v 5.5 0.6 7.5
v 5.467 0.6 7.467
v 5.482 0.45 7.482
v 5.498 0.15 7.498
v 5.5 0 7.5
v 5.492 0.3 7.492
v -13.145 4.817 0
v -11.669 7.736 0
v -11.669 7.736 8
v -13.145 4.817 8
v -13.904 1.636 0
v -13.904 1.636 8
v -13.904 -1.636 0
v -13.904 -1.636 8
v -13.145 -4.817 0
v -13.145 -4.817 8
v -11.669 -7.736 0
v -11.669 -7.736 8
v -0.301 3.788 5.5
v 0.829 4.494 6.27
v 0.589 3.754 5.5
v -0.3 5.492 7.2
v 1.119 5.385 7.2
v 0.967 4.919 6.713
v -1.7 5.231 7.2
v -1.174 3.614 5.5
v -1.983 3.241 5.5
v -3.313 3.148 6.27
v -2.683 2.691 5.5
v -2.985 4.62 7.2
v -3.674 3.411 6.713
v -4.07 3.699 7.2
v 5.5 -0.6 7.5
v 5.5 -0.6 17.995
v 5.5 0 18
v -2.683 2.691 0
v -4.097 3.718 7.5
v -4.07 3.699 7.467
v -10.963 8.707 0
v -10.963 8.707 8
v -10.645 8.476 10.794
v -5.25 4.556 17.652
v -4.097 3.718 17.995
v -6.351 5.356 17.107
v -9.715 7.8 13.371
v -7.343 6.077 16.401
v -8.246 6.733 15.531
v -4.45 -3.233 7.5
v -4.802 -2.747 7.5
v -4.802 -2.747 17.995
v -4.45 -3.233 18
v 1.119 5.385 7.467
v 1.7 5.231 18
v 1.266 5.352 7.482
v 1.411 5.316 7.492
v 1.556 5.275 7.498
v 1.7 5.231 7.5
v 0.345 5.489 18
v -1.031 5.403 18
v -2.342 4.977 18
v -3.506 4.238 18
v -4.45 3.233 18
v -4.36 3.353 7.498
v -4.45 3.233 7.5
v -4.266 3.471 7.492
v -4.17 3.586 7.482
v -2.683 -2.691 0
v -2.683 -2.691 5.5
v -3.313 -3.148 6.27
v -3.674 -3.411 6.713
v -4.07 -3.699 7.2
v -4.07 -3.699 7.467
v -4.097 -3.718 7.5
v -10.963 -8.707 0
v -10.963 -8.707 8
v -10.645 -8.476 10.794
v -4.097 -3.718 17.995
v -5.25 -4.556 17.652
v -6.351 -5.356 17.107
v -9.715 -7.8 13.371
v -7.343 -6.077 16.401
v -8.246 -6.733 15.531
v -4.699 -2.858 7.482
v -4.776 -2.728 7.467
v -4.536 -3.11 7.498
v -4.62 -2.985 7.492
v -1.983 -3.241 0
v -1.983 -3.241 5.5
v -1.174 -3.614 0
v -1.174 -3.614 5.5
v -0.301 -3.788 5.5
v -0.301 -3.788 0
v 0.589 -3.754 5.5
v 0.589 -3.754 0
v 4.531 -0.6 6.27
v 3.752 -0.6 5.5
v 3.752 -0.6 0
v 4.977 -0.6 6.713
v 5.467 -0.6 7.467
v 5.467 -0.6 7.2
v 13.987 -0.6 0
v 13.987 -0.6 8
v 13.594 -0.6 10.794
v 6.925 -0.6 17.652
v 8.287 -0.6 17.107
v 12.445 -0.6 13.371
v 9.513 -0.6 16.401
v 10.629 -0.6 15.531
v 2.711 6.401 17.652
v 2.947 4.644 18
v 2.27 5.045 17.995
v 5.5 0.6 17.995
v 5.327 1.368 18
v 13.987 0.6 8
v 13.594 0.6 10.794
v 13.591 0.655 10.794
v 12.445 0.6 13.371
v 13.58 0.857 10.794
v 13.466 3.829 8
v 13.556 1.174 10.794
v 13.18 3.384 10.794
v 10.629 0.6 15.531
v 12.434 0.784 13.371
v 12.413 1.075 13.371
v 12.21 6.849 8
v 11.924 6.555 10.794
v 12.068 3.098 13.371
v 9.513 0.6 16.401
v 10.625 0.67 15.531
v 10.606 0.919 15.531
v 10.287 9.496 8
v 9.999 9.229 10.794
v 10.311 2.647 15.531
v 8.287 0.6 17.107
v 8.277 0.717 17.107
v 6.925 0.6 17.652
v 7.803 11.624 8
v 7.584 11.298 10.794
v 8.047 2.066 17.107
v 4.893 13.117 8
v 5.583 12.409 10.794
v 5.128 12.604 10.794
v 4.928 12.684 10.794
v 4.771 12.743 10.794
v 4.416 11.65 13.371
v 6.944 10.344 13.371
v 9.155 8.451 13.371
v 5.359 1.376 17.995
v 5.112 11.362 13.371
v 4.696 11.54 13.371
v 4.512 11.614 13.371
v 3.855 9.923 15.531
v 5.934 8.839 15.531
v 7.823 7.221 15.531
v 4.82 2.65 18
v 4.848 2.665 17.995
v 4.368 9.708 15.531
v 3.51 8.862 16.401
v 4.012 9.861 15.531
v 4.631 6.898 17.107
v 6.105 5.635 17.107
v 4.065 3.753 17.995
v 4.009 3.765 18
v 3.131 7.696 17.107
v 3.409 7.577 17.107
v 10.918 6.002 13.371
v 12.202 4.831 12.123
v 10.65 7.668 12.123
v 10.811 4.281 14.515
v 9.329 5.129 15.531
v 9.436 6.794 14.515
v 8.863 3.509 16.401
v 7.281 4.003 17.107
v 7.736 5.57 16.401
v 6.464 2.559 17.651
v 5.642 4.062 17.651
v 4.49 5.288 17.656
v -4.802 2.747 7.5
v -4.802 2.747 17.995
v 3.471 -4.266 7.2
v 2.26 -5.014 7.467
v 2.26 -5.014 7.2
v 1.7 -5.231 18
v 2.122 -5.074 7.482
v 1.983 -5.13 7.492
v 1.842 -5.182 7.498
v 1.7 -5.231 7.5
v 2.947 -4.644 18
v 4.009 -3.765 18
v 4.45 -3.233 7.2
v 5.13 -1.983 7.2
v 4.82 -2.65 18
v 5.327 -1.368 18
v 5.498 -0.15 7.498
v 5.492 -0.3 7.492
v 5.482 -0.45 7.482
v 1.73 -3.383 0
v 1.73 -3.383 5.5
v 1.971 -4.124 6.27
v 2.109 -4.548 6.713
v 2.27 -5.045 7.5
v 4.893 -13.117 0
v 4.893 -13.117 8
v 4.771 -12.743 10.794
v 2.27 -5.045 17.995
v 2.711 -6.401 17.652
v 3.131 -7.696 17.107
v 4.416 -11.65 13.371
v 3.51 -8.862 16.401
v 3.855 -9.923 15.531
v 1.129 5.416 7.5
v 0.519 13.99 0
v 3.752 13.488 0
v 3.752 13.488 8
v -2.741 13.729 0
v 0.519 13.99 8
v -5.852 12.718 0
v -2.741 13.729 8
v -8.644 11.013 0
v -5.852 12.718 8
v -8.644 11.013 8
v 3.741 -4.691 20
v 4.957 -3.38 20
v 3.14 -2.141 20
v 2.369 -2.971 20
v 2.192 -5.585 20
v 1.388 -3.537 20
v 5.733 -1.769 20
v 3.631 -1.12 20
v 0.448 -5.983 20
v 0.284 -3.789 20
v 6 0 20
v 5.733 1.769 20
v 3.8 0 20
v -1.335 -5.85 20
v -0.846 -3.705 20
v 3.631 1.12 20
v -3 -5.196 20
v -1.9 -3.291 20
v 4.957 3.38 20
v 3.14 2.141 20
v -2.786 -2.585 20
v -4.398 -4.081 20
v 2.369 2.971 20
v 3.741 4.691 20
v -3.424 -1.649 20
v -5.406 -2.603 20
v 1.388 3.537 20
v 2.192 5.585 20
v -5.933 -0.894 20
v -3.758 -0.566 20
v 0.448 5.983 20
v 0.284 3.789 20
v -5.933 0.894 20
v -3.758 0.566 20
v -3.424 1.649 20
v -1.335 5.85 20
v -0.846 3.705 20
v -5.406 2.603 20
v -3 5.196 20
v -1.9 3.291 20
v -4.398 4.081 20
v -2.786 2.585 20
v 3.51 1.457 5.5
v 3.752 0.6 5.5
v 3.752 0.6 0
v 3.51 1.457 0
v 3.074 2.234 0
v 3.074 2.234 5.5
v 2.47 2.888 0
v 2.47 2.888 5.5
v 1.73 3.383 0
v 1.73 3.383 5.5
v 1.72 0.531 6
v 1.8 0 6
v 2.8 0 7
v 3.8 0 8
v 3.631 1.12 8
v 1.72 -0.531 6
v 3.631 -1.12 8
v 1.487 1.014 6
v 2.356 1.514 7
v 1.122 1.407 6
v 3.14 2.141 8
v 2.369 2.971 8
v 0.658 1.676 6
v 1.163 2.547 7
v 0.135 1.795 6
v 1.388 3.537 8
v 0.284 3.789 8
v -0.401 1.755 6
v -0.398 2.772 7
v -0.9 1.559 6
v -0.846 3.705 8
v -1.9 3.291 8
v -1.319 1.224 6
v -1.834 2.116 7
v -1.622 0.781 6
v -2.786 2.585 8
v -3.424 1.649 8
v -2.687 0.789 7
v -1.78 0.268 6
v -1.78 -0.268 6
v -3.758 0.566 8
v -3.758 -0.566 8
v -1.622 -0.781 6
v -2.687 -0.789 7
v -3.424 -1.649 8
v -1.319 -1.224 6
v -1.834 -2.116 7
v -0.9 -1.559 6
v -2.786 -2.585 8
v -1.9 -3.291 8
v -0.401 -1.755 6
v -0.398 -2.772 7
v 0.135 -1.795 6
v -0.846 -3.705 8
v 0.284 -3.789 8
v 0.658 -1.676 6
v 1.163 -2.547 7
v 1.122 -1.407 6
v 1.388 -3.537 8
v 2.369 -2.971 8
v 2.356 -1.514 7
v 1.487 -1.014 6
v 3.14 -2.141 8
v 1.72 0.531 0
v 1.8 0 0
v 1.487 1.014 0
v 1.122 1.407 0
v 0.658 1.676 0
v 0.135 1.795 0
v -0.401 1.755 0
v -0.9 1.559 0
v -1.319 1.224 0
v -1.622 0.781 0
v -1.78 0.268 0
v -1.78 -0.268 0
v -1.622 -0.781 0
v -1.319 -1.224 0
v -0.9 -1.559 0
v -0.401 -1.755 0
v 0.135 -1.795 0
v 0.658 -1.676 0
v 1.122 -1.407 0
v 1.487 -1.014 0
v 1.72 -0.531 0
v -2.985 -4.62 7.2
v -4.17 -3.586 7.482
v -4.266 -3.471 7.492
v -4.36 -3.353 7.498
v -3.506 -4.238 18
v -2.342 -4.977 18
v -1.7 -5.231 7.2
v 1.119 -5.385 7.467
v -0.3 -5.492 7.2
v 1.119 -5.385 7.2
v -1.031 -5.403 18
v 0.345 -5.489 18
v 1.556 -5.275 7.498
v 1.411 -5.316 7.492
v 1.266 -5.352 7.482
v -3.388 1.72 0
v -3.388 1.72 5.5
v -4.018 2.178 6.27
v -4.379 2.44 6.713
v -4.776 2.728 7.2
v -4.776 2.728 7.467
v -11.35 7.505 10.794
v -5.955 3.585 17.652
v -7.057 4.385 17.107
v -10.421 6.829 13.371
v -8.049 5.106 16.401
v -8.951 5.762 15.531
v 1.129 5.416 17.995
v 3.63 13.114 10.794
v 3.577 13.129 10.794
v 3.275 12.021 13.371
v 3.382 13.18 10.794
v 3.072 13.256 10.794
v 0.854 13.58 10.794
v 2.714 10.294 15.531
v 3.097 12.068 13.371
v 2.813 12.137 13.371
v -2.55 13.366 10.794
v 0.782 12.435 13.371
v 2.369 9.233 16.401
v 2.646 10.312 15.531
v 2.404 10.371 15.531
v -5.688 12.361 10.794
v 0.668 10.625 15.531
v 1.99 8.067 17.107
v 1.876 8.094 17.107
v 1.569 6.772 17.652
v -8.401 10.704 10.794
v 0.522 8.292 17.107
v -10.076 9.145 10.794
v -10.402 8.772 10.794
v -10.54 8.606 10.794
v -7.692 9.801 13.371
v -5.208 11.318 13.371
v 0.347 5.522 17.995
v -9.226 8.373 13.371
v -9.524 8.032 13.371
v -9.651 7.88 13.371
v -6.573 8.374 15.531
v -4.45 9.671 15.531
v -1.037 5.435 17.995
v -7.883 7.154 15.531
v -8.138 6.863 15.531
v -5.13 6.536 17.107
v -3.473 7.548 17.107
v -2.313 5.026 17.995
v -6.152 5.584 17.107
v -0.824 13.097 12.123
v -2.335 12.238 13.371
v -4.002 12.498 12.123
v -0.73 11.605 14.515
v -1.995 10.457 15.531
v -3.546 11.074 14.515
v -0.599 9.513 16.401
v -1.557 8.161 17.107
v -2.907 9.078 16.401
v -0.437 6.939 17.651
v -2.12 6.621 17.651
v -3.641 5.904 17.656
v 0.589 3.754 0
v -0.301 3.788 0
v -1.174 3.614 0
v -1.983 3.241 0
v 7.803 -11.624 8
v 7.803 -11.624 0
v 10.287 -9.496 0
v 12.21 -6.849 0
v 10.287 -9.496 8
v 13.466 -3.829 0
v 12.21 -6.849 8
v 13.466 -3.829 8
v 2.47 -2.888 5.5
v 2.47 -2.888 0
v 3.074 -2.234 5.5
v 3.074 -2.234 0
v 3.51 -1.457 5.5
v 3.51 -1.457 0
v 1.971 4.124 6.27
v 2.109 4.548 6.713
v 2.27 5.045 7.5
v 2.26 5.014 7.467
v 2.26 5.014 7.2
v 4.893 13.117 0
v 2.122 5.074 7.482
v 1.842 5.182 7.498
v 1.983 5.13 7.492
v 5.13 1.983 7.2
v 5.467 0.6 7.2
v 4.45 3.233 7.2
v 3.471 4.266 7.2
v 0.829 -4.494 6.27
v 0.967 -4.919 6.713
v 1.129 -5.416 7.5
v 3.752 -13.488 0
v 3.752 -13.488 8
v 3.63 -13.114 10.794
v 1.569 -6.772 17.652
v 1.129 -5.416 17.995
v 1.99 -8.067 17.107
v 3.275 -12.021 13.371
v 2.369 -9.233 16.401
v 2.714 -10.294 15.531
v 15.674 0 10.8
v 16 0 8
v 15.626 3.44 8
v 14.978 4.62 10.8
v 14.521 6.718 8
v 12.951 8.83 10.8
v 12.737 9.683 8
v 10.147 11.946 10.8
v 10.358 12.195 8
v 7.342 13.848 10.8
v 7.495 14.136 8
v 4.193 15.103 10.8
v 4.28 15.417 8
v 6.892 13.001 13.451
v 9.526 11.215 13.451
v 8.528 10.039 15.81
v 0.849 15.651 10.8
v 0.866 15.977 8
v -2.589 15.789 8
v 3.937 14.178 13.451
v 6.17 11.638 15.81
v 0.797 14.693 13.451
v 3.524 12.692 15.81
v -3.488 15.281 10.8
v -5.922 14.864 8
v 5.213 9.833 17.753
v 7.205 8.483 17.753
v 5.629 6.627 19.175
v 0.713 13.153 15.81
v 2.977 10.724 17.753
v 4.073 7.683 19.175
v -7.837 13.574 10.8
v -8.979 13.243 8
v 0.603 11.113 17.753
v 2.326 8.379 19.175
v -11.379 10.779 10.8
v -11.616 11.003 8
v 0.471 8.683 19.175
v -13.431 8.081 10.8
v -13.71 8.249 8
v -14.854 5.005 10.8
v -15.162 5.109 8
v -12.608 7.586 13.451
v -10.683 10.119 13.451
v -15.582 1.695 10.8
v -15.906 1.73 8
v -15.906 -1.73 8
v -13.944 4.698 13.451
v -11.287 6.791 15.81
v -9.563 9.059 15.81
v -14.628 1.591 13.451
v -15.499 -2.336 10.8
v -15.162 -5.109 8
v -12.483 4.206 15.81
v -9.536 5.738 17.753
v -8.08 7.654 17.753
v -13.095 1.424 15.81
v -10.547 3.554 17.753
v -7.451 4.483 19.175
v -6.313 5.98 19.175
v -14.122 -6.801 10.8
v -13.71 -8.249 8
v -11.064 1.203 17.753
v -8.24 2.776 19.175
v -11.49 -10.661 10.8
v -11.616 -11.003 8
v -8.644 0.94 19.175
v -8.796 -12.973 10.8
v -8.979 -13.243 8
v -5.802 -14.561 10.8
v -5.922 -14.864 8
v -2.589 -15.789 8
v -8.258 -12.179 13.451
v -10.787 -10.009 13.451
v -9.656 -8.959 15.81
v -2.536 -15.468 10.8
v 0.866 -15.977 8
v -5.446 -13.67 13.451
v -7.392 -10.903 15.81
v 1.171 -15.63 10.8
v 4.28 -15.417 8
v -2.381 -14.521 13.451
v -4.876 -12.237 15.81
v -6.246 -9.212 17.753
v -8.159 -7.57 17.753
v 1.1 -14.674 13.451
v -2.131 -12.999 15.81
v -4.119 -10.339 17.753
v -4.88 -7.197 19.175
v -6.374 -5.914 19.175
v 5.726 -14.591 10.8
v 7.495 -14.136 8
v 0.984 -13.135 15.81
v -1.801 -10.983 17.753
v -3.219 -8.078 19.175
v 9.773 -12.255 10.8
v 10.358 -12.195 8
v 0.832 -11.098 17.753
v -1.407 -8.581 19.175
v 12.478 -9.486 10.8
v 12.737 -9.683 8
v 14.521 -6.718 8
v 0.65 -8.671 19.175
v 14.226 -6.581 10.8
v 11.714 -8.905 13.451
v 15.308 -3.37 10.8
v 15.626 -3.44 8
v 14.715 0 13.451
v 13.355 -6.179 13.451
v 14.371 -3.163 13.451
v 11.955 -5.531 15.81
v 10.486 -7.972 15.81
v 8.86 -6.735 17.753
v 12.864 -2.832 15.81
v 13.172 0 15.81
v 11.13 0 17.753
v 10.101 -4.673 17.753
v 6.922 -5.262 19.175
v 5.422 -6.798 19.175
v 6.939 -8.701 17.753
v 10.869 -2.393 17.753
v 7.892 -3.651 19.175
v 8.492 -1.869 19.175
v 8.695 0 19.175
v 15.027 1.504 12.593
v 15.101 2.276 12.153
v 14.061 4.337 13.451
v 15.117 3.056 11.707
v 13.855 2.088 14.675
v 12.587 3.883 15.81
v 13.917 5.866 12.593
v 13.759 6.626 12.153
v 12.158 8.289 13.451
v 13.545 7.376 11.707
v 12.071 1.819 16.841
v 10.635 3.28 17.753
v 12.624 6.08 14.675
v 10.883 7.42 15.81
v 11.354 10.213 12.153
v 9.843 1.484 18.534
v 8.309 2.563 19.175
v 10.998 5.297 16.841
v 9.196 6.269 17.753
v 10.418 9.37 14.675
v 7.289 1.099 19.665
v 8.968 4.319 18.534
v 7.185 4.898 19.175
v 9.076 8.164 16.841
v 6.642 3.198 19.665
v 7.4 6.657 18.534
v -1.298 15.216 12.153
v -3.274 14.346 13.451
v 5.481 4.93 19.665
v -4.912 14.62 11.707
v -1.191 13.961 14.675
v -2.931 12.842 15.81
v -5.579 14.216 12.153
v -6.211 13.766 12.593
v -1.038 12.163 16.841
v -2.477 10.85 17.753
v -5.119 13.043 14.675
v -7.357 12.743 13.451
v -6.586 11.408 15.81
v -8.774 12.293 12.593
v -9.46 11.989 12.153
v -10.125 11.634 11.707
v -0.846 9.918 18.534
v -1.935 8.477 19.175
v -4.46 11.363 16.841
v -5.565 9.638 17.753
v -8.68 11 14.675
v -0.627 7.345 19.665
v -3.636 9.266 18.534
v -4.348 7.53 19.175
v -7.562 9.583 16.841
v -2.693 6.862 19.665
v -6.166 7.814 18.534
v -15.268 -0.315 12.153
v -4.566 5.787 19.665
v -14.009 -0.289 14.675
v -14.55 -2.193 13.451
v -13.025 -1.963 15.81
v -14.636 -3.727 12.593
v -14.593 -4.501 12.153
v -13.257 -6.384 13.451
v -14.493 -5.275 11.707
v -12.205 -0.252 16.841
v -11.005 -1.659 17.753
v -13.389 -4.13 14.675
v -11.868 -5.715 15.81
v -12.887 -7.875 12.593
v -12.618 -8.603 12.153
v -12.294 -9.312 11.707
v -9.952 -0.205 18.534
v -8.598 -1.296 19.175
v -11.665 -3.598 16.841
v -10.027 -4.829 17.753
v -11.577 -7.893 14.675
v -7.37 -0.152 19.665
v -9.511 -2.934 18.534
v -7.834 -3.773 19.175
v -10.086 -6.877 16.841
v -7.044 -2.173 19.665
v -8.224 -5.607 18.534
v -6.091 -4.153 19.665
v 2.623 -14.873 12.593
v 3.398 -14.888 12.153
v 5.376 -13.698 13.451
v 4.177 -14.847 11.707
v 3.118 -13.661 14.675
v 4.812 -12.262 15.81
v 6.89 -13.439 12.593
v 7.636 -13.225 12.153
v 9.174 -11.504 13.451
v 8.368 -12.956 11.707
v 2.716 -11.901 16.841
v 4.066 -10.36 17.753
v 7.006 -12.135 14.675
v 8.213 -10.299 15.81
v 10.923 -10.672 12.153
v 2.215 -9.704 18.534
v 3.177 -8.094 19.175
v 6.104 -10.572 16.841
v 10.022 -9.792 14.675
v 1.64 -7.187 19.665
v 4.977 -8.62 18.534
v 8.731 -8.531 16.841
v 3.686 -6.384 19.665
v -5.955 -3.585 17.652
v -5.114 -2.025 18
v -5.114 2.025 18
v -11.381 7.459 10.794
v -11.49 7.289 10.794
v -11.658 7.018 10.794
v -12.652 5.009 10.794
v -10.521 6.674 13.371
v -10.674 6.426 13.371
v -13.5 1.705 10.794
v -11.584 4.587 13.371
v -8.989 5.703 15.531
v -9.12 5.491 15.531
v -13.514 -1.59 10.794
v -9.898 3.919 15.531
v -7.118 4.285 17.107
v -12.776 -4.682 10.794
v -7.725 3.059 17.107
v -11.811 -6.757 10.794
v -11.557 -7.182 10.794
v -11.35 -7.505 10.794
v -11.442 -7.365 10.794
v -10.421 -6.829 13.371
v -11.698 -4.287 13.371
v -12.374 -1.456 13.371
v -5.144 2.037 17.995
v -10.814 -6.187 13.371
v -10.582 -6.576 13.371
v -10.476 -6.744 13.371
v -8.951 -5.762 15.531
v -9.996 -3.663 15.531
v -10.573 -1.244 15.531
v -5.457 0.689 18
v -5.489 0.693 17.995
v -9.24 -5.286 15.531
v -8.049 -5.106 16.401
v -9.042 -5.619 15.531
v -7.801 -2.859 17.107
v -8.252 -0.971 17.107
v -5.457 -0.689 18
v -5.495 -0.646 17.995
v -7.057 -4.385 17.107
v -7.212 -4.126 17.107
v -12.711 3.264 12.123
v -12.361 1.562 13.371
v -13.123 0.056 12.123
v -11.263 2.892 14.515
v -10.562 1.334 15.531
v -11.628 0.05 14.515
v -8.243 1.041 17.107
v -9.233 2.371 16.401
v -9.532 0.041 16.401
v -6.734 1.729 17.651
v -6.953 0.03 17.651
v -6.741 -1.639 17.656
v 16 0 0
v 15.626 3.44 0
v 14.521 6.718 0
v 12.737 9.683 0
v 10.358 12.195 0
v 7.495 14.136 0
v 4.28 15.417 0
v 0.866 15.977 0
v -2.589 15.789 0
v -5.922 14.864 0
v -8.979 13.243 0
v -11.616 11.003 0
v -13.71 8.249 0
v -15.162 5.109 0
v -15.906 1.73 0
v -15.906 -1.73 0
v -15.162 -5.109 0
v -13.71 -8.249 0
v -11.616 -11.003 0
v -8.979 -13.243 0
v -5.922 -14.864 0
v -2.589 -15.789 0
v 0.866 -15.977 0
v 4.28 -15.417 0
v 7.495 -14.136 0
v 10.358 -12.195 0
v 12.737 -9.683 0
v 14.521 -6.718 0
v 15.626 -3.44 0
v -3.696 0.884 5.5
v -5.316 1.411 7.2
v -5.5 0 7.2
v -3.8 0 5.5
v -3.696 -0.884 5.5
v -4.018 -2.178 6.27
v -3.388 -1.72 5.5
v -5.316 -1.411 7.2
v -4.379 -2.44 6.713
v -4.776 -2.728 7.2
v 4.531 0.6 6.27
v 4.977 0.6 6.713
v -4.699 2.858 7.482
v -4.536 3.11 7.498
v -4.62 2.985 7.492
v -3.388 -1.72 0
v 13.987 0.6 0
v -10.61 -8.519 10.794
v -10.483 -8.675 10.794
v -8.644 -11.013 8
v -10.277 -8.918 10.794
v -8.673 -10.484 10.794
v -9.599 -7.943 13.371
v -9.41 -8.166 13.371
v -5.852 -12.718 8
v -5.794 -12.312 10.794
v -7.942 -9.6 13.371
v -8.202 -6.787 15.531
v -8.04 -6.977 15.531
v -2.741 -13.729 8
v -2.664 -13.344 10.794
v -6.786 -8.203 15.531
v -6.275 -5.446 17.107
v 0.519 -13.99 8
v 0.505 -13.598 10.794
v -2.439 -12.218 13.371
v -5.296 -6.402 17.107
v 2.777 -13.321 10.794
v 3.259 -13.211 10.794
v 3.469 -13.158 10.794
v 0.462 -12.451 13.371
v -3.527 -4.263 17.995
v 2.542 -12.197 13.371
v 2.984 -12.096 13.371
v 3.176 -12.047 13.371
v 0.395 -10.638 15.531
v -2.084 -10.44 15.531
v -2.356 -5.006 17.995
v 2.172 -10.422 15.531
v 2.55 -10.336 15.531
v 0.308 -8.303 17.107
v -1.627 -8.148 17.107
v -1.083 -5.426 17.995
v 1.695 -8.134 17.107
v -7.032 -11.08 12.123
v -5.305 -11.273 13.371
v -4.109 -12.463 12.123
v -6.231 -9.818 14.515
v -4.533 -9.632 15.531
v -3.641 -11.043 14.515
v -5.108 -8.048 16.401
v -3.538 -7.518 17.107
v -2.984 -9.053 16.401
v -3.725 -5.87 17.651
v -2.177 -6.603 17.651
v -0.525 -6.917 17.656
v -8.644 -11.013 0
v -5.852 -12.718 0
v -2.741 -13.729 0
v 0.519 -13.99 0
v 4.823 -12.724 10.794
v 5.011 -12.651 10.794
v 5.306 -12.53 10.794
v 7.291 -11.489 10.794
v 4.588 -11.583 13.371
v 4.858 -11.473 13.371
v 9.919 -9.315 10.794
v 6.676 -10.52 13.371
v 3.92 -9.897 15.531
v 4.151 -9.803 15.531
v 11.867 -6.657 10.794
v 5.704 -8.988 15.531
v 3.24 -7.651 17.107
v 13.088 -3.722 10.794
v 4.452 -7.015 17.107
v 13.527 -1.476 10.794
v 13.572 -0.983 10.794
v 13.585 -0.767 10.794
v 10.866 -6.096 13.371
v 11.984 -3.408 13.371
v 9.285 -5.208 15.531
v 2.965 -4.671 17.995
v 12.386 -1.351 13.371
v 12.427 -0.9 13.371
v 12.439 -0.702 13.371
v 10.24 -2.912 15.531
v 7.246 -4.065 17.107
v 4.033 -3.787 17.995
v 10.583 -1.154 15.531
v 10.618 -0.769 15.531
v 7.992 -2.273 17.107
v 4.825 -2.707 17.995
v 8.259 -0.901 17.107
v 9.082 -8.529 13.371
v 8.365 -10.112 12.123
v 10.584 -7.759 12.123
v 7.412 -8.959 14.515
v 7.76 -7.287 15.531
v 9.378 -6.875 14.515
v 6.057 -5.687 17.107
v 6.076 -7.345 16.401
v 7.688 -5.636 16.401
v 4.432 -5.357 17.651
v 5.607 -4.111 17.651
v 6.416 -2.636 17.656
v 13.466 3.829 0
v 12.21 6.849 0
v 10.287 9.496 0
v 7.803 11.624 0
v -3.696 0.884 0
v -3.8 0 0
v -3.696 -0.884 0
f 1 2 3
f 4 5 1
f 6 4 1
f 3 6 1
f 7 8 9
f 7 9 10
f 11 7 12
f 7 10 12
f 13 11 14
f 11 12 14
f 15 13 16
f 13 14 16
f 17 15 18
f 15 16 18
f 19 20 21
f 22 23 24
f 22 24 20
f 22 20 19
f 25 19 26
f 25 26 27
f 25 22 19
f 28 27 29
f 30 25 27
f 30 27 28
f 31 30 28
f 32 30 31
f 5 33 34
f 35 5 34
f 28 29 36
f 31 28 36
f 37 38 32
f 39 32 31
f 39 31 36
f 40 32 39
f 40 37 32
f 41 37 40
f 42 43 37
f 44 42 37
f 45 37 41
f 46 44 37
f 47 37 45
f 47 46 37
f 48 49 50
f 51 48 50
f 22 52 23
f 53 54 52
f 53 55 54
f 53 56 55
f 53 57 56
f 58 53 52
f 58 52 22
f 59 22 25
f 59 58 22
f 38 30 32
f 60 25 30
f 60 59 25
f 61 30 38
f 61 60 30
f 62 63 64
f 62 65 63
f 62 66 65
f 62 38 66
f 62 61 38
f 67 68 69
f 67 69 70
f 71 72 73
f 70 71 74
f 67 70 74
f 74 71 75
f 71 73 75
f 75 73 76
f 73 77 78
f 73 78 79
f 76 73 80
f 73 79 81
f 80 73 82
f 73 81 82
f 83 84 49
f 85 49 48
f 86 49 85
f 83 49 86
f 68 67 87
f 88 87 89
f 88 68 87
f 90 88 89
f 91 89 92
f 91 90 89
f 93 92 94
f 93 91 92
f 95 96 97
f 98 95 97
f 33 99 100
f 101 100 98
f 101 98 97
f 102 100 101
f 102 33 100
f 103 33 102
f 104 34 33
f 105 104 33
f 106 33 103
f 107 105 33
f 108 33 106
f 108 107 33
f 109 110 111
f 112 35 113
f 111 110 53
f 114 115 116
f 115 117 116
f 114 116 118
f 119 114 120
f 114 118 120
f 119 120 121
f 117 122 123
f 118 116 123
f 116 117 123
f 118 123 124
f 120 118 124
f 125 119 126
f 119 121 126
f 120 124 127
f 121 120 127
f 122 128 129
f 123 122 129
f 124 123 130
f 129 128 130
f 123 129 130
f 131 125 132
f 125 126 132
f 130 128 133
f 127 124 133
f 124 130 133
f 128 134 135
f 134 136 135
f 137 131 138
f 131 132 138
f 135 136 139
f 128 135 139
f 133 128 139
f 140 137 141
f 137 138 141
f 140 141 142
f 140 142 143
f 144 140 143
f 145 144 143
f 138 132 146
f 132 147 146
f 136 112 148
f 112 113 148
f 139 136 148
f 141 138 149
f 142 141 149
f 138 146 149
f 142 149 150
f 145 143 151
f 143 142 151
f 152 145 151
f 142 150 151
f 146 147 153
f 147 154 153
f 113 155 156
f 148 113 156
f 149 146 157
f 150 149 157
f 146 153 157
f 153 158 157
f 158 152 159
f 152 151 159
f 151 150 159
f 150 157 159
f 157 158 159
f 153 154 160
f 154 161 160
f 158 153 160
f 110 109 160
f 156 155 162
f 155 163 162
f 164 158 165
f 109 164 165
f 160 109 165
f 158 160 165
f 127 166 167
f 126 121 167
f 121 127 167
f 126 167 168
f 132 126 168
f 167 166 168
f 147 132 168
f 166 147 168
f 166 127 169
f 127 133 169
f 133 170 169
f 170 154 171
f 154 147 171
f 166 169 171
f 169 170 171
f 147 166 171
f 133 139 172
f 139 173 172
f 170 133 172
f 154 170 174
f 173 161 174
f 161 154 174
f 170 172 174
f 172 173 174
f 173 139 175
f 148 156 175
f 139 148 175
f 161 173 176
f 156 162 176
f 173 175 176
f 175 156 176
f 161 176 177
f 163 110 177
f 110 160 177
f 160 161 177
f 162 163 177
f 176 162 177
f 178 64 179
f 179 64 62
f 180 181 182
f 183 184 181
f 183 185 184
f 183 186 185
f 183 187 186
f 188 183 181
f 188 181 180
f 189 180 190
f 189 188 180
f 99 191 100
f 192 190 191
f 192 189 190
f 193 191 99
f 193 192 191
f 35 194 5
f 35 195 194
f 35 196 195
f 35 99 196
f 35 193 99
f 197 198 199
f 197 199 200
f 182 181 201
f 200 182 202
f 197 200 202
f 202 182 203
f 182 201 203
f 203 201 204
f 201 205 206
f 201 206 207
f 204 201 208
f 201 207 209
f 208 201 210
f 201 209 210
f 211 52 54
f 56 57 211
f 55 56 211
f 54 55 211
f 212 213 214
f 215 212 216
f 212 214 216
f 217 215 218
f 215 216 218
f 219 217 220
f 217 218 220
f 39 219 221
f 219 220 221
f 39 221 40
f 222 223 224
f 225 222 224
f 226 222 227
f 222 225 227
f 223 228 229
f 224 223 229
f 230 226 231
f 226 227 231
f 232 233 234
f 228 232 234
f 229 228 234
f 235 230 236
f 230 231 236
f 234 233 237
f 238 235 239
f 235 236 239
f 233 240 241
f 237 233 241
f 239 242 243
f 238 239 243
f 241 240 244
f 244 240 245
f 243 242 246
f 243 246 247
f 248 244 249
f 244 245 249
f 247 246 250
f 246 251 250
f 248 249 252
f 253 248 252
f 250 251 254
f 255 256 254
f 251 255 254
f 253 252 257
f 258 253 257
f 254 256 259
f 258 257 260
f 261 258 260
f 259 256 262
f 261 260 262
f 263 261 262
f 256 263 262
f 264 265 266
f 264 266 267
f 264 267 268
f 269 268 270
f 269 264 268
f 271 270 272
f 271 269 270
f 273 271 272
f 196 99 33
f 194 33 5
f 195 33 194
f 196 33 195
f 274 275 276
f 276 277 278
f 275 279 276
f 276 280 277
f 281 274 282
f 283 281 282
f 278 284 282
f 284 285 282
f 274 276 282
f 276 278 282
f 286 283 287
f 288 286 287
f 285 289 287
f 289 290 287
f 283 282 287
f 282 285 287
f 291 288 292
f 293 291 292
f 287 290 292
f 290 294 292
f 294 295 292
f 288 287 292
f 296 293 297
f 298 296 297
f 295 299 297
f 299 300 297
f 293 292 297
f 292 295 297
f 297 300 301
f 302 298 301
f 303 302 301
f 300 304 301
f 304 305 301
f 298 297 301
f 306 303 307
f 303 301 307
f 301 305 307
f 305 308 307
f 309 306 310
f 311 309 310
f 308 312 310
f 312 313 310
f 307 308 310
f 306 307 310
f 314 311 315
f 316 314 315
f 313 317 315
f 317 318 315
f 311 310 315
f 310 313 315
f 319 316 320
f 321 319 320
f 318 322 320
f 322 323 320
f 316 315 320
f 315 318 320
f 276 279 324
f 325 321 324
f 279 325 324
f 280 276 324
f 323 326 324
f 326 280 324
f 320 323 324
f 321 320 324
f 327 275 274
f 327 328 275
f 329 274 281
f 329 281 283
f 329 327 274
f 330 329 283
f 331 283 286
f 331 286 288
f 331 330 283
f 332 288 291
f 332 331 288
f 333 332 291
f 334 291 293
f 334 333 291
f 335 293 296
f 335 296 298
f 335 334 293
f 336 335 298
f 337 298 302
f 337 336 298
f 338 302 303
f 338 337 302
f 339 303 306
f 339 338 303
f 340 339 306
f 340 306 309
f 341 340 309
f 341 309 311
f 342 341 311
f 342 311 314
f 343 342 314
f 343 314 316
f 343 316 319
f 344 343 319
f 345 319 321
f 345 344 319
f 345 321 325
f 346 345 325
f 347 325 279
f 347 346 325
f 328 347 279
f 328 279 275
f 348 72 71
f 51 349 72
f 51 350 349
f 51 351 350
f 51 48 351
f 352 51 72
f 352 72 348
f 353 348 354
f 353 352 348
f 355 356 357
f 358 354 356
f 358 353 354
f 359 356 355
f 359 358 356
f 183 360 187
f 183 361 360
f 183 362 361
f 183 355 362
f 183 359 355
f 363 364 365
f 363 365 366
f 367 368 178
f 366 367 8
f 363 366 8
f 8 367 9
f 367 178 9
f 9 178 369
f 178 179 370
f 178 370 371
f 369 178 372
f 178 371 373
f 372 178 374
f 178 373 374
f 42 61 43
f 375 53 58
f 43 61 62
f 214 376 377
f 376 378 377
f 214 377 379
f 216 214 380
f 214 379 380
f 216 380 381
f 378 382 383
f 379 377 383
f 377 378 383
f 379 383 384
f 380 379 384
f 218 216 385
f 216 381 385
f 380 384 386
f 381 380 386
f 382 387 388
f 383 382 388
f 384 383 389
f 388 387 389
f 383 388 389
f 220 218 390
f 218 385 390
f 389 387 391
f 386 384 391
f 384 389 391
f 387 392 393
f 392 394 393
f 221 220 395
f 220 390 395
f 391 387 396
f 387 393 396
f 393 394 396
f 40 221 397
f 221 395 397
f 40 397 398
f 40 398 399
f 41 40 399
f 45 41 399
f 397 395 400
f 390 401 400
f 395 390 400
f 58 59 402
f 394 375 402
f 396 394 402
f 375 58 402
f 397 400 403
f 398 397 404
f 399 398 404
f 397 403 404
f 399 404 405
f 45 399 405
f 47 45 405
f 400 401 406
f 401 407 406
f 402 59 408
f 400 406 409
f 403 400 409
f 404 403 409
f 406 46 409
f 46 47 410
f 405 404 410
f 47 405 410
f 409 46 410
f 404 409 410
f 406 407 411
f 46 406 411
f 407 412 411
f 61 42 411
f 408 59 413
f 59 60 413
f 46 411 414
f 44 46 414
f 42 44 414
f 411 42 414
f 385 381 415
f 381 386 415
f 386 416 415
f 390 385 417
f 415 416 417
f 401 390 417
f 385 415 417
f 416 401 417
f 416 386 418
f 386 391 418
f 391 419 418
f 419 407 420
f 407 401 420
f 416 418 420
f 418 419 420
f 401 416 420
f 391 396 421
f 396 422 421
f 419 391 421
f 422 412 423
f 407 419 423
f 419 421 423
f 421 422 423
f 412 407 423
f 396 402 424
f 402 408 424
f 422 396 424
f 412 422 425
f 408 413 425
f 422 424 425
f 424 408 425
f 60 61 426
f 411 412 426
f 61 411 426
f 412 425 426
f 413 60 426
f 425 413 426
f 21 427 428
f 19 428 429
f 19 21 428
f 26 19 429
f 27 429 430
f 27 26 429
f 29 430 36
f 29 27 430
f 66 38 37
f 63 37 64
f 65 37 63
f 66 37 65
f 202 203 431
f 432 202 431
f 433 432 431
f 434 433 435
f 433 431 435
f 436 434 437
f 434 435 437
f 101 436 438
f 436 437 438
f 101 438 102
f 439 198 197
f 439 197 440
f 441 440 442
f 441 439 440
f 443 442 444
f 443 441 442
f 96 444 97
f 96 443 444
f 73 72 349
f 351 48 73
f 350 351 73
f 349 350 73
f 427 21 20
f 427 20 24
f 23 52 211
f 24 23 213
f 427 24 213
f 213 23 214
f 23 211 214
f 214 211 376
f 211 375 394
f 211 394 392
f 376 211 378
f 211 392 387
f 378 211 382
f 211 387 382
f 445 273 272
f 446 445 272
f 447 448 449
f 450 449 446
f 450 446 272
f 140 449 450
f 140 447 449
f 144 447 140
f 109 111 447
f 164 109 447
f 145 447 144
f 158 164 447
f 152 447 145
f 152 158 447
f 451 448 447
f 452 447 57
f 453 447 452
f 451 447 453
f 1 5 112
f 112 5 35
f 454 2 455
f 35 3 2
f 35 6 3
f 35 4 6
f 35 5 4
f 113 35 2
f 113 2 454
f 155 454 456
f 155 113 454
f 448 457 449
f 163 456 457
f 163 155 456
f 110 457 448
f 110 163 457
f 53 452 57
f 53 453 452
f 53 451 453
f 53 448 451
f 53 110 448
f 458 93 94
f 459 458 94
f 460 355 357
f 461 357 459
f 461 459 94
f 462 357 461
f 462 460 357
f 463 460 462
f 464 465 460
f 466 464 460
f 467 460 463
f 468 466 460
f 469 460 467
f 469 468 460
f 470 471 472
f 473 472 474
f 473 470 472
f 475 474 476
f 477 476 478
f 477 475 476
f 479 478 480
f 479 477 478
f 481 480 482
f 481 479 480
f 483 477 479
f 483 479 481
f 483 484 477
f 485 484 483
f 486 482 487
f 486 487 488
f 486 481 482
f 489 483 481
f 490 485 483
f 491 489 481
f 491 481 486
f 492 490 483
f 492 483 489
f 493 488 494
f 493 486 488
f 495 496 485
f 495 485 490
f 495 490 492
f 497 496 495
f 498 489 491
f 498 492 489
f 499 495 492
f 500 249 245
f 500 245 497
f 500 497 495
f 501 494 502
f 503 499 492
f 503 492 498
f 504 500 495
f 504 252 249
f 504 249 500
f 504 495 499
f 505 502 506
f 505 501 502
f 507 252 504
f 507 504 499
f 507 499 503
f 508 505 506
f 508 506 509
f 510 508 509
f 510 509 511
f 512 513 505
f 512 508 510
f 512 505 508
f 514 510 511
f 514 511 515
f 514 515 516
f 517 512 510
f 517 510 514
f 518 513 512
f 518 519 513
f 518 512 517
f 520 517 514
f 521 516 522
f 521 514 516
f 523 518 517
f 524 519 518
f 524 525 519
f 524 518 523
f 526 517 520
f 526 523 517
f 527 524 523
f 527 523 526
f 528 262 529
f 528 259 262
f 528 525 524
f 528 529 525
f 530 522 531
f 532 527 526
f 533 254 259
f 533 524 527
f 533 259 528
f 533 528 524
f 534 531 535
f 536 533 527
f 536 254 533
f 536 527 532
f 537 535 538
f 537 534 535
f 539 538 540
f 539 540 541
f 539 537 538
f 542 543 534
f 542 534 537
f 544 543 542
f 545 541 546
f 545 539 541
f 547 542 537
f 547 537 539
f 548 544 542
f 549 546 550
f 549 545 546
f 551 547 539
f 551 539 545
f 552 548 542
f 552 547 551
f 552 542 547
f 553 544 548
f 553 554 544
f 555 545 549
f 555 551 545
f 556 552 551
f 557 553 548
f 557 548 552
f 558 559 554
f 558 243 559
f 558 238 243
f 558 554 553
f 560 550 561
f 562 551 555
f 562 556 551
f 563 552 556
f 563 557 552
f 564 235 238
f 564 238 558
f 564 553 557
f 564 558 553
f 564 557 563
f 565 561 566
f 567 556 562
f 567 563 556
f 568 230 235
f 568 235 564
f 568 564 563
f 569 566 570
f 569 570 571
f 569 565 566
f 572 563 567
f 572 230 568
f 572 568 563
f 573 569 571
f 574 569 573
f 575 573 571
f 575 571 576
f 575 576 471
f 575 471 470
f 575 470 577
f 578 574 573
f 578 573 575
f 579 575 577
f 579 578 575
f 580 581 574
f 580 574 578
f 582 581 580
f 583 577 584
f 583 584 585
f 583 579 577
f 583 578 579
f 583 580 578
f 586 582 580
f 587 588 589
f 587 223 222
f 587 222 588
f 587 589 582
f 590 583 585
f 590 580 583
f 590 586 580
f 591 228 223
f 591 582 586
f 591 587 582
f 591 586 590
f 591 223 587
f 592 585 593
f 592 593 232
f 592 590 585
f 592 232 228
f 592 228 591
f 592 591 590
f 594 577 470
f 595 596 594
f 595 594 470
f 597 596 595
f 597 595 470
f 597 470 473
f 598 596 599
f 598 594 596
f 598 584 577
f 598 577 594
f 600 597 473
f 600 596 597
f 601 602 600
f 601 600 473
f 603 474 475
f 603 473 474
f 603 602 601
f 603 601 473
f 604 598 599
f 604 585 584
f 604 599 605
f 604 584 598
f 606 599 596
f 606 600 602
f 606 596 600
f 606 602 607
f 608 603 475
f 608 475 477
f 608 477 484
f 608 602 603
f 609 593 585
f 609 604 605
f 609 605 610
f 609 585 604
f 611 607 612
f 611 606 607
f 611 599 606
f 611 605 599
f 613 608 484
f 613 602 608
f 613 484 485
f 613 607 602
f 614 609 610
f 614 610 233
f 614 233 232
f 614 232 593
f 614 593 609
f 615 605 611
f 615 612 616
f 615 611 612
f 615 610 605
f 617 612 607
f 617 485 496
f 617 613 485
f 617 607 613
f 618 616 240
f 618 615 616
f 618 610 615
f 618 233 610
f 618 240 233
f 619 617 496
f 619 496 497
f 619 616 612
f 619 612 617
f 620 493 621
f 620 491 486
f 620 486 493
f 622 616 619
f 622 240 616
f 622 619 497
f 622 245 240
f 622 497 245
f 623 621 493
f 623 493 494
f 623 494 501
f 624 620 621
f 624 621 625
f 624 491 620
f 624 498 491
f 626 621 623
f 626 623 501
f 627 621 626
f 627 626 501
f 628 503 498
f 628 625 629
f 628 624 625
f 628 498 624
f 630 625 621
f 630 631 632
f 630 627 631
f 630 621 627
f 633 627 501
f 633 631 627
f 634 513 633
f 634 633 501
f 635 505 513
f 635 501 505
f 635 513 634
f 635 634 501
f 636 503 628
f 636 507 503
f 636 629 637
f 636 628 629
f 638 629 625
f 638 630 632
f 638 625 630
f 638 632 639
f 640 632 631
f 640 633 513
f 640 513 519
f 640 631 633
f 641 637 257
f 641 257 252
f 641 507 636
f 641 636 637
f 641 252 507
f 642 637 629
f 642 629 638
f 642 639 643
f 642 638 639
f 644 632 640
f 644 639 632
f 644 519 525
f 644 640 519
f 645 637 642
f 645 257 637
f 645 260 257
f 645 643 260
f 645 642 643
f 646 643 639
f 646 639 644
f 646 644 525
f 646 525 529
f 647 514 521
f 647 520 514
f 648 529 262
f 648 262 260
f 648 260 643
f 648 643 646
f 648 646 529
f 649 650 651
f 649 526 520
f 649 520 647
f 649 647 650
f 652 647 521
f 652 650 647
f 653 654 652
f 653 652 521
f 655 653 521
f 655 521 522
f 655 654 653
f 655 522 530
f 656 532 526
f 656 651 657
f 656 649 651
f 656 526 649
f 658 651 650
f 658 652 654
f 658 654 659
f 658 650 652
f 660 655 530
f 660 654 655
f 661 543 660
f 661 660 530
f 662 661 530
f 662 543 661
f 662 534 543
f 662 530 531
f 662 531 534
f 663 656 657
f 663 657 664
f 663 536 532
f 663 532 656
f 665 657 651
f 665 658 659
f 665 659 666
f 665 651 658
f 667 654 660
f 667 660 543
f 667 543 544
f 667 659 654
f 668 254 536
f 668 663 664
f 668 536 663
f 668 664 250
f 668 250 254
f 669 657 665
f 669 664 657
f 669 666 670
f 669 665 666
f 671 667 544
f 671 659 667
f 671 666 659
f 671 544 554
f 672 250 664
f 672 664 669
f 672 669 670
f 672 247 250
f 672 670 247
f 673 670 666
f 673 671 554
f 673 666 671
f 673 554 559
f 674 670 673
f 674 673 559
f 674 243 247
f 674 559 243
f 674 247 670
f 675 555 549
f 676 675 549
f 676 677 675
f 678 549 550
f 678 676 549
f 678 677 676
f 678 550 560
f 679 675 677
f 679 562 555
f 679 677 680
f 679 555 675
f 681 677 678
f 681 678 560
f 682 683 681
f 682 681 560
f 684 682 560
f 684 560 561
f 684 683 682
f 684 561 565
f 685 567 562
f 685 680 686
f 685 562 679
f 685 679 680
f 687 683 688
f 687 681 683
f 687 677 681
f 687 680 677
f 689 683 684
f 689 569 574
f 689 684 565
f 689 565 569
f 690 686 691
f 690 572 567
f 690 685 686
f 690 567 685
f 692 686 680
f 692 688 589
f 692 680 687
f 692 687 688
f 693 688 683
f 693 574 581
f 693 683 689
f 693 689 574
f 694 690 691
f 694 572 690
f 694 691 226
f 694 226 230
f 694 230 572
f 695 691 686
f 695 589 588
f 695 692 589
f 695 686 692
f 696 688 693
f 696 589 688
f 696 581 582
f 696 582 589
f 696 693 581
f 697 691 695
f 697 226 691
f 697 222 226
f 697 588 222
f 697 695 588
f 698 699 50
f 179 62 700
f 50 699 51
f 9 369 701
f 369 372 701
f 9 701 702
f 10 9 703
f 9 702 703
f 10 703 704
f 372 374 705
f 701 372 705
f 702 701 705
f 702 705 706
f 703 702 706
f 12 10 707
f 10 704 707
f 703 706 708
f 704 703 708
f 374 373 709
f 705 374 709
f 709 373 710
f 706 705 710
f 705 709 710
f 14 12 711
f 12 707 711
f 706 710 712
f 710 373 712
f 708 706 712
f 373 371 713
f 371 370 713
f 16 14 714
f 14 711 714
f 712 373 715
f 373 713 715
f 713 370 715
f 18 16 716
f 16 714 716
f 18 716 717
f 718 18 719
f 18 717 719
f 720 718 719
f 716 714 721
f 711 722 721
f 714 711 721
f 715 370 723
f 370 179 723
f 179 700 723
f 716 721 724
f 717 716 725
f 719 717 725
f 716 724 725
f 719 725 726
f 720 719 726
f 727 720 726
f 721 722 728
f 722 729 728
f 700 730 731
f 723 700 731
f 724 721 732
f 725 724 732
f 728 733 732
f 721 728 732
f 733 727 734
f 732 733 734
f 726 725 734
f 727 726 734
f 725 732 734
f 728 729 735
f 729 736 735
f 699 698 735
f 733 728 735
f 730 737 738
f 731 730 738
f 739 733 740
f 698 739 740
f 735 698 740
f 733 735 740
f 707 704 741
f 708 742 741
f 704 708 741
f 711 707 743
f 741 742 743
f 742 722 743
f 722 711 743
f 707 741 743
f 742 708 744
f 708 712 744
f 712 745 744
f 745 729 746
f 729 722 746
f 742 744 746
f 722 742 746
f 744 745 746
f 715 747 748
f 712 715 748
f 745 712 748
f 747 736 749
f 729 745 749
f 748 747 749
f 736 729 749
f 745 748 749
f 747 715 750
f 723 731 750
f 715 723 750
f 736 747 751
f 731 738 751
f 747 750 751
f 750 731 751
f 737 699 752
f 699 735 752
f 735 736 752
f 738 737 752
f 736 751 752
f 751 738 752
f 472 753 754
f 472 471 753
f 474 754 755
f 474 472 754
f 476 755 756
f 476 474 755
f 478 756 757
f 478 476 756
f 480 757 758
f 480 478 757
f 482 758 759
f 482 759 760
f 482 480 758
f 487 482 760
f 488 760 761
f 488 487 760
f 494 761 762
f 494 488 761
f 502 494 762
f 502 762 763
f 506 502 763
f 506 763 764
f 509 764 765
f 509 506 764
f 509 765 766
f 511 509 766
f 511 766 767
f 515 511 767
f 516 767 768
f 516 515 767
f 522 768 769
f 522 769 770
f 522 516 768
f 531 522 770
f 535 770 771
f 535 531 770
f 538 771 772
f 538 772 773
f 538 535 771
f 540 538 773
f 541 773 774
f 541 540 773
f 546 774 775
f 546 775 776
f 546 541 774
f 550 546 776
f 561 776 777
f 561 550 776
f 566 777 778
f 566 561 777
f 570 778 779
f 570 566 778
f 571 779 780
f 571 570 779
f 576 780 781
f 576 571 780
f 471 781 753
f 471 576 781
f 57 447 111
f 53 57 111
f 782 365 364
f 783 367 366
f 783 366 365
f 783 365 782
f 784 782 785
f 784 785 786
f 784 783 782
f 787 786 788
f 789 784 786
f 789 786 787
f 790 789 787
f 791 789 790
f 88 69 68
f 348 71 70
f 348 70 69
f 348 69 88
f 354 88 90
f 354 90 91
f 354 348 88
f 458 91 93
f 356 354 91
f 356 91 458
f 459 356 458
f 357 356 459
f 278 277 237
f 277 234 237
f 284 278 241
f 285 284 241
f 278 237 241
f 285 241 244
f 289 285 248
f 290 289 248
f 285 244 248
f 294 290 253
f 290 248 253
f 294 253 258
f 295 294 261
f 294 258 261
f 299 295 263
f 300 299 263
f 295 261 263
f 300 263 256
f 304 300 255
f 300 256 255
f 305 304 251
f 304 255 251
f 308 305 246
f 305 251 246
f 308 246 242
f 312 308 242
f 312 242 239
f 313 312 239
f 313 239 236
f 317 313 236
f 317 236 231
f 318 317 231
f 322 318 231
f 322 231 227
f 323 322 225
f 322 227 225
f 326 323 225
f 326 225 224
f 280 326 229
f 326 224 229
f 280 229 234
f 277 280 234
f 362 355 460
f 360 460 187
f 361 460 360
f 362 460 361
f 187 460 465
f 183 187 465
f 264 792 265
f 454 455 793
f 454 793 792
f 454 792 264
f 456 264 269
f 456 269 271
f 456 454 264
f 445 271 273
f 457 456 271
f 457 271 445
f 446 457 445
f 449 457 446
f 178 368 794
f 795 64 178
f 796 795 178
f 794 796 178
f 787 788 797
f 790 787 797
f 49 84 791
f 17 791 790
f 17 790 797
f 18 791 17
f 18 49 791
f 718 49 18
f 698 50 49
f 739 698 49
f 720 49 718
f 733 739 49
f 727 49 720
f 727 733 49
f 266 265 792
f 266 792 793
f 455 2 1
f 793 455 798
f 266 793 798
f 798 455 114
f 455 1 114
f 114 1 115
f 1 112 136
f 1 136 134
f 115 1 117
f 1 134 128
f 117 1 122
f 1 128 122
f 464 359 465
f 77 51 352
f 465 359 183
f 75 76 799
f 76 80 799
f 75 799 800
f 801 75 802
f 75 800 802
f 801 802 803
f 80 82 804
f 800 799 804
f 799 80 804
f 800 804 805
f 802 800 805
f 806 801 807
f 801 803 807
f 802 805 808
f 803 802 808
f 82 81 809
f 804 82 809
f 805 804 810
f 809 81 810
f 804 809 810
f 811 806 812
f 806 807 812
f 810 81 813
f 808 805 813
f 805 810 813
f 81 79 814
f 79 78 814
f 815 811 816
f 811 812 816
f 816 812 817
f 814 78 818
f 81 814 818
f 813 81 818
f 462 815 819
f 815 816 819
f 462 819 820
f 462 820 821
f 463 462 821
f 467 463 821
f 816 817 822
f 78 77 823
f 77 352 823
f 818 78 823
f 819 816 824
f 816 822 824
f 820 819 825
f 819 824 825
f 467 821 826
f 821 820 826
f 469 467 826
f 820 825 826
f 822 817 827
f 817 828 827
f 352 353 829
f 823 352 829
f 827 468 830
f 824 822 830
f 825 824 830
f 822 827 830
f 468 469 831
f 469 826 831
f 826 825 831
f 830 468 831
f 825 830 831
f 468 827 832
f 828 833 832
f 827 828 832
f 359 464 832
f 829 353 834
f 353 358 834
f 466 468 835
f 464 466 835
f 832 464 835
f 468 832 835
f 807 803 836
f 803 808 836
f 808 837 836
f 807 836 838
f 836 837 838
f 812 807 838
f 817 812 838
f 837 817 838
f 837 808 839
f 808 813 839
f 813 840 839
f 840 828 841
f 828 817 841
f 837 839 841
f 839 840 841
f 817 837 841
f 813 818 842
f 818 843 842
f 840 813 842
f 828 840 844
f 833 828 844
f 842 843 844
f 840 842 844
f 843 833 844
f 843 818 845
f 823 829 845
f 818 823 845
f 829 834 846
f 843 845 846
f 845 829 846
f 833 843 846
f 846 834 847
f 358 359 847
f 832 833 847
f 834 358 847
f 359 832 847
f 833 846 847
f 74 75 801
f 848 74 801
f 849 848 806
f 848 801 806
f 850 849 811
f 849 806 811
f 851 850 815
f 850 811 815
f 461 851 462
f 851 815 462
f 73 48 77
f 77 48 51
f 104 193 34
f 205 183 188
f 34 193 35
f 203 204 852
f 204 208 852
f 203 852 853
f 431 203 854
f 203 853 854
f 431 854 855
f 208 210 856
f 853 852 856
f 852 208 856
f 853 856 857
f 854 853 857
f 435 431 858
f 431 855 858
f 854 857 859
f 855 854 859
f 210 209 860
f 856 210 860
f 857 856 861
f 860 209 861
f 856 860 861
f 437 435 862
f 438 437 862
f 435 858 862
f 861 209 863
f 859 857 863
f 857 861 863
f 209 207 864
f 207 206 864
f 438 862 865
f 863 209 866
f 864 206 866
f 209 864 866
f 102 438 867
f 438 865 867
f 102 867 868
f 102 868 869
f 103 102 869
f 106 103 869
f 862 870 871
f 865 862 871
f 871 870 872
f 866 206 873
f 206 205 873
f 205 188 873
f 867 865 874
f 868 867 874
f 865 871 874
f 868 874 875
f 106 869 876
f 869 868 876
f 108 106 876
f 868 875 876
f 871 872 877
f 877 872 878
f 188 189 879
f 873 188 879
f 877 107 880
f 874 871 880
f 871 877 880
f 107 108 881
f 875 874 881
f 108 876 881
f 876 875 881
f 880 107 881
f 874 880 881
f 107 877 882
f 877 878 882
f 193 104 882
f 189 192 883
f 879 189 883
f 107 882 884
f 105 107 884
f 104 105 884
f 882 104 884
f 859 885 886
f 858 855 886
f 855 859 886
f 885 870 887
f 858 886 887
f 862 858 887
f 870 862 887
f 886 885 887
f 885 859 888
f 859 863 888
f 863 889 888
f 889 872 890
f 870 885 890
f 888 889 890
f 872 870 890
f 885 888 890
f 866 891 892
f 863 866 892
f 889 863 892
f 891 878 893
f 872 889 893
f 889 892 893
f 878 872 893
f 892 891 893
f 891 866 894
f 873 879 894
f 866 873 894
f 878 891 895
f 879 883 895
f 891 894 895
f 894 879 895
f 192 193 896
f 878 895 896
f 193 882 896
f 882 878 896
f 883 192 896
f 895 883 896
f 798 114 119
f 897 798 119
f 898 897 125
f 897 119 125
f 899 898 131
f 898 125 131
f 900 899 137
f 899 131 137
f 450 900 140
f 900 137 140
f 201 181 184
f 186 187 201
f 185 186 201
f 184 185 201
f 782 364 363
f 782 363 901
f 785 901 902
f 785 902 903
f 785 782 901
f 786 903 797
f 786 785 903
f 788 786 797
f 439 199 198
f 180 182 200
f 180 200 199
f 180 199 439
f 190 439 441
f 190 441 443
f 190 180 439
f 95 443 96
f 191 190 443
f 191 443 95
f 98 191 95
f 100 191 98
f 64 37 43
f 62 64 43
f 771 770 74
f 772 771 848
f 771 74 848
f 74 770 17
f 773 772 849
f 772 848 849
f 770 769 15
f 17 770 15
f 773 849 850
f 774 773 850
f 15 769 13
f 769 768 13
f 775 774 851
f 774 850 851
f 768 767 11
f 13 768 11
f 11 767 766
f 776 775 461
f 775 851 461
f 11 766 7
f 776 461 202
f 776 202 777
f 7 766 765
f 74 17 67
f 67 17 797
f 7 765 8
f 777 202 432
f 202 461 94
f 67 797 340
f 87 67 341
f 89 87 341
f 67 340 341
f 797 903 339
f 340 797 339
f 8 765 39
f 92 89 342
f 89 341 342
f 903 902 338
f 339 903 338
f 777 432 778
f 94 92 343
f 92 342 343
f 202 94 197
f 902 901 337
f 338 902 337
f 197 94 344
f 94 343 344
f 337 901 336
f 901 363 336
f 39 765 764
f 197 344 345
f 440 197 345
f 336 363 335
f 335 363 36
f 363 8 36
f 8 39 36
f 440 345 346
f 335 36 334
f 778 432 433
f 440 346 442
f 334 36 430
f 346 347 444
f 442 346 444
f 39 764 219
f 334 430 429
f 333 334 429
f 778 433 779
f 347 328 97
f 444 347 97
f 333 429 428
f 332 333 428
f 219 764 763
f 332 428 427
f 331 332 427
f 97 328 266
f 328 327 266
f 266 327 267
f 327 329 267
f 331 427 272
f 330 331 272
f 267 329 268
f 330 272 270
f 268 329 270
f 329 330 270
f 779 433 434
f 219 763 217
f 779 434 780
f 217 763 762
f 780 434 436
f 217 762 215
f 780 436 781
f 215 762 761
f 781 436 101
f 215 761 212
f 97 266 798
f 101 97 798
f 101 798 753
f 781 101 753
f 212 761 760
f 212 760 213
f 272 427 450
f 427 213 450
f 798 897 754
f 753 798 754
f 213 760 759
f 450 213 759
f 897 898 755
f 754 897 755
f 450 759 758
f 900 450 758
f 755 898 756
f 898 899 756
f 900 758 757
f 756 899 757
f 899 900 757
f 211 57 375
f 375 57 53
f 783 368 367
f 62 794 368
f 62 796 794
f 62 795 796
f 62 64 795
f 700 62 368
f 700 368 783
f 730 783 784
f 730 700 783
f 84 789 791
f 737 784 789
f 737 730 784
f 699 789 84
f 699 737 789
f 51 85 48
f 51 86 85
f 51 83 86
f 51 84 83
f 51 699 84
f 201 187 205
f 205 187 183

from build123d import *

# Parameters (mm, degrees)
PAD_DEPTH          = 0.6
POLARPATTERN_COUNT = 5


with BuildPart() as part:
    # Sketch → Revolution (revolve)
    with BuildSketch(Plane.XZ):
        with BuildLine():
            Line((16, 0), (16, 8))
            ThreePointArc((16, 8), (13.1723, 15.81025), (6, 20))
            Line((3.8, 20), (6, 20))
            Line((3.8, 8), (3.8, 20))
            Line((1.8, 6), (3.8, 8))
            Line((1.8, 6), (1.8, 0))
            Line((1.8, 0), (3.8, 0))
            Line((3.8, 0), (3.8, 5.5))
            Line((3.8, 5.5), (5.5, 7.2))
            Line((5.5, 7.2), (5.5, 18))
            ThreePointArc((14, 8), (11.587885, 14.562202), (5.5, 18))
            Line((14, 0), (14, 8))
            Line((16, 0), (14, 0))
        make_face()
    revolve(axis=Axis((0, 0, 0), (0, 0, 1)))

    # Sketch001 → Pad (new body, symmetric)
    with BuildSketch(Plane.XZ):
        with BuildLine():
            Line((14.5, 0), (14.5, 8))
            ThreePointArc((14.5, 8), (11.942101, 14.914658), (5.5, 18.5))
            Line((5.5, 7.5), (5.5, 18.5))
            Line((3.5, 5.5), (5.5, 7.5))
            Line((3.5, 0), (3.5, 5.5))
            Line((3.5, 0), (14.5, 0))
        make_face()
    pad = extrude(amount=PAD_DEPTH, both=True)

    # PolarPattern: Pad ×5 about axis
    polarpattern_axis = Axis((0, 0, 0), (0, 0, 1))
    for i in range(1, POLARPATTERN_COUNT):
        add(pad.rotate(polarpattern_axis, i * 360 / POLARPATTERN_COUNT))


solid = part.part
